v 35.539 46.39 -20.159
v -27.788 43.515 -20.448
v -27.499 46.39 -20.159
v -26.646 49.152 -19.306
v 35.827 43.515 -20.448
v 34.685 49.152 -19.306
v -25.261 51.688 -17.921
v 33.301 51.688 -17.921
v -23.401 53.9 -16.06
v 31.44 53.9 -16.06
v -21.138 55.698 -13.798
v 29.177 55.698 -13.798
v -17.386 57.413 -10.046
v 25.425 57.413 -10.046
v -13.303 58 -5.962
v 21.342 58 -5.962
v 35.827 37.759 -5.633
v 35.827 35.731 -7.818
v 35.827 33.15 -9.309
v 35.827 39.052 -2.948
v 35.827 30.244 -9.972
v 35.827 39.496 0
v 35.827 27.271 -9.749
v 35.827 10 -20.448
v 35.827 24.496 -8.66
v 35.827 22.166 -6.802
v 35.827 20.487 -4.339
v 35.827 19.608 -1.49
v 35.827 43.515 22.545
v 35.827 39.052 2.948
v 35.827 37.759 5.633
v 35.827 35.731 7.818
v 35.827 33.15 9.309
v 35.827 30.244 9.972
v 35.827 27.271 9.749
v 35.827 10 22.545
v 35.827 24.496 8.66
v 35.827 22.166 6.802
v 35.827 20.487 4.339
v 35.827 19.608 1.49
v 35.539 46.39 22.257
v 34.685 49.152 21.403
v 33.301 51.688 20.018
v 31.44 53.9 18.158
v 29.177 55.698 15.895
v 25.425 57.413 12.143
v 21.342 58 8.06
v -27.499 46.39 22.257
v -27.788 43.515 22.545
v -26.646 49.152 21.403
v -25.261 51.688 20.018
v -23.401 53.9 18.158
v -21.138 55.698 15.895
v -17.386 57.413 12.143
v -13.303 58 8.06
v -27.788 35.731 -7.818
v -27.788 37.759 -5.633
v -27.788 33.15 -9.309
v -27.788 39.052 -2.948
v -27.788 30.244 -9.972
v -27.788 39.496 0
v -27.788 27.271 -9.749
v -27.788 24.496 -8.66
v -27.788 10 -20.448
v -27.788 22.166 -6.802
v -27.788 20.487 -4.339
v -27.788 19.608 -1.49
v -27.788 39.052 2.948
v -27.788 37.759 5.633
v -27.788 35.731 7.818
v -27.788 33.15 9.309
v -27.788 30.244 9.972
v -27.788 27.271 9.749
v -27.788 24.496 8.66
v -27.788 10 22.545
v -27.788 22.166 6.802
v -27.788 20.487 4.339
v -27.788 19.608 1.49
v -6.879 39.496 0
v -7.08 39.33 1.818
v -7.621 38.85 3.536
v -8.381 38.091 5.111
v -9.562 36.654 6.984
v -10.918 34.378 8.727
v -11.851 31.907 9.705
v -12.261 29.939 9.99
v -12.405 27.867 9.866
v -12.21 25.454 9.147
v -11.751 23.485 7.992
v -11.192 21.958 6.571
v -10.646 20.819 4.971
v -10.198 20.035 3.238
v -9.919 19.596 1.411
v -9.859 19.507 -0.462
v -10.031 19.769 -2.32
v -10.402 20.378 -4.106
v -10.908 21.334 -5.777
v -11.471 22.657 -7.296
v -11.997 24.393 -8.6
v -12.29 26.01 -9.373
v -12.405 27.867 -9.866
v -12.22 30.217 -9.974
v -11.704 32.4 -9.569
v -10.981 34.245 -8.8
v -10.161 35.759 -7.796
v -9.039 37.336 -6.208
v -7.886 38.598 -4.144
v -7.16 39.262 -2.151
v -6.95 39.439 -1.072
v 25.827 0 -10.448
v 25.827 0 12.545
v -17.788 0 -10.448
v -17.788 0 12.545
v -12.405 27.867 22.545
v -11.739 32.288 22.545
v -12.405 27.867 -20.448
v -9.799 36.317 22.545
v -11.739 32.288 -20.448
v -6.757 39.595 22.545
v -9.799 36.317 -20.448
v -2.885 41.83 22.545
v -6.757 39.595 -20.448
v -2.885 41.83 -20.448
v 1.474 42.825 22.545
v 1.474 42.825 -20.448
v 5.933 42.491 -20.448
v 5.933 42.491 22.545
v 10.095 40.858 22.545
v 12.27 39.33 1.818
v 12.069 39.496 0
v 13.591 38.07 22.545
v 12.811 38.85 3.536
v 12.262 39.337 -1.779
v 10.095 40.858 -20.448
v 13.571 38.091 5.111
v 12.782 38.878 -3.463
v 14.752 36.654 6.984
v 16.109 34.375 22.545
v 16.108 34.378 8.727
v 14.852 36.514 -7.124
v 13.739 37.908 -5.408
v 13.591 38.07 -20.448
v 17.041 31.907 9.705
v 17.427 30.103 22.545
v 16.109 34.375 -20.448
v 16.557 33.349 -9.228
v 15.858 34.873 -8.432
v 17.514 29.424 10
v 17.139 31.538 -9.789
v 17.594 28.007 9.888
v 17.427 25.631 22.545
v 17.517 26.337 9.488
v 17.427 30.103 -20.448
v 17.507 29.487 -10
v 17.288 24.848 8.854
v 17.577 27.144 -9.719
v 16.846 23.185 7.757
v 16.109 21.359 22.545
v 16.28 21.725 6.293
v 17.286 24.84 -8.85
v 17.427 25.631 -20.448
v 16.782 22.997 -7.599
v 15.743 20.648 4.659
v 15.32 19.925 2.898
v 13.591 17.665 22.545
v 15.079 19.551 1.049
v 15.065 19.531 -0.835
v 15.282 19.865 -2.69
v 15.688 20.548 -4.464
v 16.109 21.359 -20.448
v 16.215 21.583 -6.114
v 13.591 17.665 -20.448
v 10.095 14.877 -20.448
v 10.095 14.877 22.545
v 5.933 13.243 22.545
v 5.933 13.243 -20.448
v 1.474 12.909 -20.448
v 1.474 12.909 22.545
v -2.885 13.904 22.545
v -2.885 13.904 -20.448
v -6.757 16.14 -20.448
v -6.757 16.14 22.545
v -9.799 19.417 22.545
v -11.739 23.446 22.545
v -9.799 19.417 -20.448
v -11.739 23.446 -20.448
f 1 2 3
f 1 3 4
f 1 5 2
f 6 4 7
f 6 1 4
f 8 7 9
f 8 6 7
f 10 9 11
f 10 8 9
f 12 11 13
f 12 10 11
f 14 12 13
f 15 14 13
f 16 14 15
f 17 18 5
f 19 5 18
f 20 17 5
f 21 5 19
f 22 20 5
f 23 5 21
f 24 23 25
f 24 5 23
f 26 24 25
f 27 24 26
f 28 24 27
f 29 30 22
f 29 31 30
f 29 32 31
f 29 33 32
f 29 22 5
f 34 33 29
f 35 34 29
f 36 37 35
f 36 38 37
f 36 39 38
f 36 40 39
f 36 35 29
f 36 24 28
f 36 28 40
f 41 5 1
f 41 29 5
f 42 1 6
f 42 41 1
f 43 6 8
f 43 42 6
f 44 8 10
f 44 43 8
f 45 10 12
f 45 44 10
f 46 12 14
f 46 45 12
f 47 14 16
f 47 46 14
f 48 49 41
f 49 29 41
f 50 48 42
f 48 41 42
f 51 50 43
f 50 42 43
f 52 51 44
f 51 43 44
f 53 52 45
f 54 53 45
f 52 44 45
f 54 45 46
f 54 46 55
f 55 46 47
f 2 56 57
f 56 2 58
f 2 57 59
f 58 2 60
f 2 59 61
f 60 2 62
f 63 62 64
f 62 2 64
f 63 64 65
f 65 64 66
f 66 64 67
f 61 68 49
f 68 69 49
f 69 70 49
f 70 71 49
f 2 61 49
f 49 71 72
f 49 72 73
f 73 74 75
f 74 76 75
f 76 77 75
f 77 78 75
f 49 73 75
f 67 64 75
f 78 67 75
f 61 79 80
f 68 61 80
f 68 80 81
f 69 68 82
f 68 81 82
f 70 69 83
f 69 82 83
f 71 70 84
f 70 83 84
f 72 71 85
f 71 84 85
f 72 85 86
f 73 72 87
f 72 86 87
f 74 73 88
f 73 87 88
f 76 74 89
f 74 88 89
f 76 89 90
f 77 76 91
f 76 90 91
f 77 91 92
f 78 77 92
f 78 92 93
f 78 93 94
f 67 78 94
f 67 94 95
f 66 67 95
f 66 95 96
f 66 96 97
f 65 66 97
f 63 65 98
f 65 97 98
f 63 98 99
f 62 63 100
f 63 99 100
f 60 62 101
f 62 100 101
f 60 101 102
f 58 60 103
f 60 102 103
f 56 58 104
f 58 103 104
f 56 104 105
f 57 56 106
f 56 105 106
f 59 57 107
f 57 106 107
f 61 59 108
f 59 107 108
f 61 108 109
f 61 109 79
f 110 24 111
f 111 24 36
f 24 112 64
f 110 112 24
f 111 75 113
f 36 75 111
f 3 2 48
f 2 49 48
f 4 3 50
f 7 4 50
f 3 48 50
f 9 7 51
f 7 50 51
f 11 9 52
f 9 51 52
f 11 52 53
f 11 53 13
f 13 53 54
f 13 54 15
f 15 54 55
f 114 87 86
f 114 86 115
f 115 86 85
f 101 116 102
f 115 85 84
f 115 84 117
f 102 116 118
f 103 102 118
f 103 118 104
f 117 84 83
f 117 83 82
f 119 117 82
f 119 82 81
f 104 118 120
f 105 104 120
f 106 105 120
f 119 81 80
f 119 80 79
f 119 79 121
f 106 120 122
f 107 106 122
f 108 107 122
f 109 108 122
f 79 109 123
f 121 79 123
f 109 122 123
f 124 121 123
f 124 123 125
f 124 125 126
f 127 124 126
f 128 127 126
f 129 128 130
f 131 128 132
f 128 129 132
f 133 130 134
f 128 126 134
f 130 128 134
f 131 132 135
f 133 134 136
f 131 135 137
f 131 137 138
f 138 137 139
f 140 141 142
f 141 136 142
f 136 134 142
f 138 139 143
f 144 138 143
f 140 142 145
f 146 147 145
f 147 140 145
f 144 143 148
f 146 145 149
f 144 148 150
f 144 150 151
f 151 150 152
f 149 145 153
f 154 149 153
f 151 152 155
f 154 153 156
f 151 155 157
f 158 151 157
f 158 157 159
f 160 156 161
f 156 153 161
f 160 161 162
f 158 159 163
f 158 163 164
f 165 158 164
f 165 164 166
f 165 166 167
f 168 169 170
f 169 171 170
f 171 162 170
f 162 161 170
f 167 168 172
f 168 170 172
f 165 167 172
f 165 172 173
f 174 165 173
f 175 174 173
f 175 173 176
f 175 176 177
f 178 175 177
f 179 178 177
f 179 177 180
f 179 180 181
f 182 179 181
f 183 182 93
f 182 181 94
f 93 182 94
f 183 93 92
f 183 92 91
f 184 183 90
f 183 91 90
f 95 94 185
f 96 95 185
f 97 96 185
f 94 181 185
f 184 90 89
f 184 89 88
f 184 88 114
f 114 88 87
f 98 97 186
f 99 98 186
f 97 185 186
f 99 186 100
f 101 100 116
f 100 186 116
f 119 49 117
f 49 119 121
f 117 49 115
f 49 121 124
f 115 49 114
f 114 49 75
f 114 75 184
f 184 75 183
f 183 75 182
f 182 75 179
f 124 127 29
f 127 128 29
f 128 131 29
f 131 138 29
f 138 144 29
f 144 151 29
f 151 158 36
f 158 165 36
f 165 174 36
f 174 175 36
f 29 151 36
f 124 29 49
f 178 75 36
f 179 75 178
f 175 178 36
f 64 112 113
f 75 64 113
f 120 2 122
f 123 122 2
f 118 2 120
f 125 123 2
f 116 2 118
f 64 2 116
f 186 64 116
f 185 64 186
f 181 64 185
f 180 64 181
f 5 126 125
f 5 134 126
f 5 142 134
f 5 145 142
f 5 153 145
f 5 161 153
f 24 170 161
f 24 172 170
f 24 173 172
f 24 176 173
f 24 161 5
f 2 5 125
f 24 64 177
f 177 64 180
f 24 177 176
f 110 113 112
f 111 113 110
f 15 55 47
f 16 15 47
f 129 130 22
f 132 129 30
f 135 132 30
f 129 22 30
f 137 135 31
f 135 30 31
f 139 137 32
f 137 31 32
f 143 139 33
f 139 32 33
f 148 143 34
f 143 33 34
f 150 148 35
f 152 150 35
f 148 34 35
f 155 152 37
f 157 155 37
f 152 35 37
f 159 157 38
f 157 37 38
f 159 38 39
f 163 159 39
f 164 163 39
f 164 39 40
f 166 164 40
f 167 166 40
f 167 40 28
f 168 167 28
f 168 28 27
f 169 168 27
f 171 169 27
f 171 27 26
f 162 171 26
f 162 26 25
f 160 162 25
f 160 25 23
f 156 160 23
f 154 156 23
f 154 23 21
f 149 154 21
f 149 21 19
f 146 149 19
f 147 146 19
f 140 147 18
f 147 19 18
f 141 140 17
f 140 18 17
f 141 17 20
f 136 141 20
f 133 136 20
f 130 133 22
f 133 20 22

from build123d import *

# Parameters (mm, degrees)
F1_W     = 63.614873
F1_H     = 42.992467
F2_DEPTH = 58
F3_R     = 14.485281
F4_SIZE  = 10
F6_D     = 30
F8_D     = 20


with BuildPart() as f2:
    # F1 (on face) → F2 (new body)
    with BuildSketch(Plane.XZ):
        with Locations((4.01963, 1.048599)):
            Rectangle(F1_W, F1_H)
    extrude(amount=-F2_DEPTH)

    # F3
    f3_edges = [f2.edges().sort_by_distance(p)[0] for p in [
        (-27.787806, 58, 1.048599),
        (4.01963, 58, 22.544833),
        (35.827067, 58, 1.048599),
        (4.01963, 58, -20.447634),
    ]]
    fillet(f3_edges, radius=F3_R)

    # F4
    f4_edges = [f2.edges().sort_by_distance(p)[0] for p in [
        (35.827067, 0, 1.048599),
        (4.01963, 0, -20.447634),
        (-27.787806, 0, 1.048599),
        (4.01963, 0, 22.544833),
    ]]
    chamfer(f4_edges, length=F4_SIZE)

    # F6 (through all)
    with Locations(Plane.XY.offset(22.544833)):
        with Locations((2.594914, 27.867122)):
            Hole(F6_D / 2)

    # F8 (through all)
    with Locations(Plane(origin=(-27.787806, 0, 0), x_dir=(0, -1, 0), z_dir=(-1, 0, 0))):
        with Locations((-29.496336, 0)):
            Hole(F8_D / 2)


solid = f2.part
